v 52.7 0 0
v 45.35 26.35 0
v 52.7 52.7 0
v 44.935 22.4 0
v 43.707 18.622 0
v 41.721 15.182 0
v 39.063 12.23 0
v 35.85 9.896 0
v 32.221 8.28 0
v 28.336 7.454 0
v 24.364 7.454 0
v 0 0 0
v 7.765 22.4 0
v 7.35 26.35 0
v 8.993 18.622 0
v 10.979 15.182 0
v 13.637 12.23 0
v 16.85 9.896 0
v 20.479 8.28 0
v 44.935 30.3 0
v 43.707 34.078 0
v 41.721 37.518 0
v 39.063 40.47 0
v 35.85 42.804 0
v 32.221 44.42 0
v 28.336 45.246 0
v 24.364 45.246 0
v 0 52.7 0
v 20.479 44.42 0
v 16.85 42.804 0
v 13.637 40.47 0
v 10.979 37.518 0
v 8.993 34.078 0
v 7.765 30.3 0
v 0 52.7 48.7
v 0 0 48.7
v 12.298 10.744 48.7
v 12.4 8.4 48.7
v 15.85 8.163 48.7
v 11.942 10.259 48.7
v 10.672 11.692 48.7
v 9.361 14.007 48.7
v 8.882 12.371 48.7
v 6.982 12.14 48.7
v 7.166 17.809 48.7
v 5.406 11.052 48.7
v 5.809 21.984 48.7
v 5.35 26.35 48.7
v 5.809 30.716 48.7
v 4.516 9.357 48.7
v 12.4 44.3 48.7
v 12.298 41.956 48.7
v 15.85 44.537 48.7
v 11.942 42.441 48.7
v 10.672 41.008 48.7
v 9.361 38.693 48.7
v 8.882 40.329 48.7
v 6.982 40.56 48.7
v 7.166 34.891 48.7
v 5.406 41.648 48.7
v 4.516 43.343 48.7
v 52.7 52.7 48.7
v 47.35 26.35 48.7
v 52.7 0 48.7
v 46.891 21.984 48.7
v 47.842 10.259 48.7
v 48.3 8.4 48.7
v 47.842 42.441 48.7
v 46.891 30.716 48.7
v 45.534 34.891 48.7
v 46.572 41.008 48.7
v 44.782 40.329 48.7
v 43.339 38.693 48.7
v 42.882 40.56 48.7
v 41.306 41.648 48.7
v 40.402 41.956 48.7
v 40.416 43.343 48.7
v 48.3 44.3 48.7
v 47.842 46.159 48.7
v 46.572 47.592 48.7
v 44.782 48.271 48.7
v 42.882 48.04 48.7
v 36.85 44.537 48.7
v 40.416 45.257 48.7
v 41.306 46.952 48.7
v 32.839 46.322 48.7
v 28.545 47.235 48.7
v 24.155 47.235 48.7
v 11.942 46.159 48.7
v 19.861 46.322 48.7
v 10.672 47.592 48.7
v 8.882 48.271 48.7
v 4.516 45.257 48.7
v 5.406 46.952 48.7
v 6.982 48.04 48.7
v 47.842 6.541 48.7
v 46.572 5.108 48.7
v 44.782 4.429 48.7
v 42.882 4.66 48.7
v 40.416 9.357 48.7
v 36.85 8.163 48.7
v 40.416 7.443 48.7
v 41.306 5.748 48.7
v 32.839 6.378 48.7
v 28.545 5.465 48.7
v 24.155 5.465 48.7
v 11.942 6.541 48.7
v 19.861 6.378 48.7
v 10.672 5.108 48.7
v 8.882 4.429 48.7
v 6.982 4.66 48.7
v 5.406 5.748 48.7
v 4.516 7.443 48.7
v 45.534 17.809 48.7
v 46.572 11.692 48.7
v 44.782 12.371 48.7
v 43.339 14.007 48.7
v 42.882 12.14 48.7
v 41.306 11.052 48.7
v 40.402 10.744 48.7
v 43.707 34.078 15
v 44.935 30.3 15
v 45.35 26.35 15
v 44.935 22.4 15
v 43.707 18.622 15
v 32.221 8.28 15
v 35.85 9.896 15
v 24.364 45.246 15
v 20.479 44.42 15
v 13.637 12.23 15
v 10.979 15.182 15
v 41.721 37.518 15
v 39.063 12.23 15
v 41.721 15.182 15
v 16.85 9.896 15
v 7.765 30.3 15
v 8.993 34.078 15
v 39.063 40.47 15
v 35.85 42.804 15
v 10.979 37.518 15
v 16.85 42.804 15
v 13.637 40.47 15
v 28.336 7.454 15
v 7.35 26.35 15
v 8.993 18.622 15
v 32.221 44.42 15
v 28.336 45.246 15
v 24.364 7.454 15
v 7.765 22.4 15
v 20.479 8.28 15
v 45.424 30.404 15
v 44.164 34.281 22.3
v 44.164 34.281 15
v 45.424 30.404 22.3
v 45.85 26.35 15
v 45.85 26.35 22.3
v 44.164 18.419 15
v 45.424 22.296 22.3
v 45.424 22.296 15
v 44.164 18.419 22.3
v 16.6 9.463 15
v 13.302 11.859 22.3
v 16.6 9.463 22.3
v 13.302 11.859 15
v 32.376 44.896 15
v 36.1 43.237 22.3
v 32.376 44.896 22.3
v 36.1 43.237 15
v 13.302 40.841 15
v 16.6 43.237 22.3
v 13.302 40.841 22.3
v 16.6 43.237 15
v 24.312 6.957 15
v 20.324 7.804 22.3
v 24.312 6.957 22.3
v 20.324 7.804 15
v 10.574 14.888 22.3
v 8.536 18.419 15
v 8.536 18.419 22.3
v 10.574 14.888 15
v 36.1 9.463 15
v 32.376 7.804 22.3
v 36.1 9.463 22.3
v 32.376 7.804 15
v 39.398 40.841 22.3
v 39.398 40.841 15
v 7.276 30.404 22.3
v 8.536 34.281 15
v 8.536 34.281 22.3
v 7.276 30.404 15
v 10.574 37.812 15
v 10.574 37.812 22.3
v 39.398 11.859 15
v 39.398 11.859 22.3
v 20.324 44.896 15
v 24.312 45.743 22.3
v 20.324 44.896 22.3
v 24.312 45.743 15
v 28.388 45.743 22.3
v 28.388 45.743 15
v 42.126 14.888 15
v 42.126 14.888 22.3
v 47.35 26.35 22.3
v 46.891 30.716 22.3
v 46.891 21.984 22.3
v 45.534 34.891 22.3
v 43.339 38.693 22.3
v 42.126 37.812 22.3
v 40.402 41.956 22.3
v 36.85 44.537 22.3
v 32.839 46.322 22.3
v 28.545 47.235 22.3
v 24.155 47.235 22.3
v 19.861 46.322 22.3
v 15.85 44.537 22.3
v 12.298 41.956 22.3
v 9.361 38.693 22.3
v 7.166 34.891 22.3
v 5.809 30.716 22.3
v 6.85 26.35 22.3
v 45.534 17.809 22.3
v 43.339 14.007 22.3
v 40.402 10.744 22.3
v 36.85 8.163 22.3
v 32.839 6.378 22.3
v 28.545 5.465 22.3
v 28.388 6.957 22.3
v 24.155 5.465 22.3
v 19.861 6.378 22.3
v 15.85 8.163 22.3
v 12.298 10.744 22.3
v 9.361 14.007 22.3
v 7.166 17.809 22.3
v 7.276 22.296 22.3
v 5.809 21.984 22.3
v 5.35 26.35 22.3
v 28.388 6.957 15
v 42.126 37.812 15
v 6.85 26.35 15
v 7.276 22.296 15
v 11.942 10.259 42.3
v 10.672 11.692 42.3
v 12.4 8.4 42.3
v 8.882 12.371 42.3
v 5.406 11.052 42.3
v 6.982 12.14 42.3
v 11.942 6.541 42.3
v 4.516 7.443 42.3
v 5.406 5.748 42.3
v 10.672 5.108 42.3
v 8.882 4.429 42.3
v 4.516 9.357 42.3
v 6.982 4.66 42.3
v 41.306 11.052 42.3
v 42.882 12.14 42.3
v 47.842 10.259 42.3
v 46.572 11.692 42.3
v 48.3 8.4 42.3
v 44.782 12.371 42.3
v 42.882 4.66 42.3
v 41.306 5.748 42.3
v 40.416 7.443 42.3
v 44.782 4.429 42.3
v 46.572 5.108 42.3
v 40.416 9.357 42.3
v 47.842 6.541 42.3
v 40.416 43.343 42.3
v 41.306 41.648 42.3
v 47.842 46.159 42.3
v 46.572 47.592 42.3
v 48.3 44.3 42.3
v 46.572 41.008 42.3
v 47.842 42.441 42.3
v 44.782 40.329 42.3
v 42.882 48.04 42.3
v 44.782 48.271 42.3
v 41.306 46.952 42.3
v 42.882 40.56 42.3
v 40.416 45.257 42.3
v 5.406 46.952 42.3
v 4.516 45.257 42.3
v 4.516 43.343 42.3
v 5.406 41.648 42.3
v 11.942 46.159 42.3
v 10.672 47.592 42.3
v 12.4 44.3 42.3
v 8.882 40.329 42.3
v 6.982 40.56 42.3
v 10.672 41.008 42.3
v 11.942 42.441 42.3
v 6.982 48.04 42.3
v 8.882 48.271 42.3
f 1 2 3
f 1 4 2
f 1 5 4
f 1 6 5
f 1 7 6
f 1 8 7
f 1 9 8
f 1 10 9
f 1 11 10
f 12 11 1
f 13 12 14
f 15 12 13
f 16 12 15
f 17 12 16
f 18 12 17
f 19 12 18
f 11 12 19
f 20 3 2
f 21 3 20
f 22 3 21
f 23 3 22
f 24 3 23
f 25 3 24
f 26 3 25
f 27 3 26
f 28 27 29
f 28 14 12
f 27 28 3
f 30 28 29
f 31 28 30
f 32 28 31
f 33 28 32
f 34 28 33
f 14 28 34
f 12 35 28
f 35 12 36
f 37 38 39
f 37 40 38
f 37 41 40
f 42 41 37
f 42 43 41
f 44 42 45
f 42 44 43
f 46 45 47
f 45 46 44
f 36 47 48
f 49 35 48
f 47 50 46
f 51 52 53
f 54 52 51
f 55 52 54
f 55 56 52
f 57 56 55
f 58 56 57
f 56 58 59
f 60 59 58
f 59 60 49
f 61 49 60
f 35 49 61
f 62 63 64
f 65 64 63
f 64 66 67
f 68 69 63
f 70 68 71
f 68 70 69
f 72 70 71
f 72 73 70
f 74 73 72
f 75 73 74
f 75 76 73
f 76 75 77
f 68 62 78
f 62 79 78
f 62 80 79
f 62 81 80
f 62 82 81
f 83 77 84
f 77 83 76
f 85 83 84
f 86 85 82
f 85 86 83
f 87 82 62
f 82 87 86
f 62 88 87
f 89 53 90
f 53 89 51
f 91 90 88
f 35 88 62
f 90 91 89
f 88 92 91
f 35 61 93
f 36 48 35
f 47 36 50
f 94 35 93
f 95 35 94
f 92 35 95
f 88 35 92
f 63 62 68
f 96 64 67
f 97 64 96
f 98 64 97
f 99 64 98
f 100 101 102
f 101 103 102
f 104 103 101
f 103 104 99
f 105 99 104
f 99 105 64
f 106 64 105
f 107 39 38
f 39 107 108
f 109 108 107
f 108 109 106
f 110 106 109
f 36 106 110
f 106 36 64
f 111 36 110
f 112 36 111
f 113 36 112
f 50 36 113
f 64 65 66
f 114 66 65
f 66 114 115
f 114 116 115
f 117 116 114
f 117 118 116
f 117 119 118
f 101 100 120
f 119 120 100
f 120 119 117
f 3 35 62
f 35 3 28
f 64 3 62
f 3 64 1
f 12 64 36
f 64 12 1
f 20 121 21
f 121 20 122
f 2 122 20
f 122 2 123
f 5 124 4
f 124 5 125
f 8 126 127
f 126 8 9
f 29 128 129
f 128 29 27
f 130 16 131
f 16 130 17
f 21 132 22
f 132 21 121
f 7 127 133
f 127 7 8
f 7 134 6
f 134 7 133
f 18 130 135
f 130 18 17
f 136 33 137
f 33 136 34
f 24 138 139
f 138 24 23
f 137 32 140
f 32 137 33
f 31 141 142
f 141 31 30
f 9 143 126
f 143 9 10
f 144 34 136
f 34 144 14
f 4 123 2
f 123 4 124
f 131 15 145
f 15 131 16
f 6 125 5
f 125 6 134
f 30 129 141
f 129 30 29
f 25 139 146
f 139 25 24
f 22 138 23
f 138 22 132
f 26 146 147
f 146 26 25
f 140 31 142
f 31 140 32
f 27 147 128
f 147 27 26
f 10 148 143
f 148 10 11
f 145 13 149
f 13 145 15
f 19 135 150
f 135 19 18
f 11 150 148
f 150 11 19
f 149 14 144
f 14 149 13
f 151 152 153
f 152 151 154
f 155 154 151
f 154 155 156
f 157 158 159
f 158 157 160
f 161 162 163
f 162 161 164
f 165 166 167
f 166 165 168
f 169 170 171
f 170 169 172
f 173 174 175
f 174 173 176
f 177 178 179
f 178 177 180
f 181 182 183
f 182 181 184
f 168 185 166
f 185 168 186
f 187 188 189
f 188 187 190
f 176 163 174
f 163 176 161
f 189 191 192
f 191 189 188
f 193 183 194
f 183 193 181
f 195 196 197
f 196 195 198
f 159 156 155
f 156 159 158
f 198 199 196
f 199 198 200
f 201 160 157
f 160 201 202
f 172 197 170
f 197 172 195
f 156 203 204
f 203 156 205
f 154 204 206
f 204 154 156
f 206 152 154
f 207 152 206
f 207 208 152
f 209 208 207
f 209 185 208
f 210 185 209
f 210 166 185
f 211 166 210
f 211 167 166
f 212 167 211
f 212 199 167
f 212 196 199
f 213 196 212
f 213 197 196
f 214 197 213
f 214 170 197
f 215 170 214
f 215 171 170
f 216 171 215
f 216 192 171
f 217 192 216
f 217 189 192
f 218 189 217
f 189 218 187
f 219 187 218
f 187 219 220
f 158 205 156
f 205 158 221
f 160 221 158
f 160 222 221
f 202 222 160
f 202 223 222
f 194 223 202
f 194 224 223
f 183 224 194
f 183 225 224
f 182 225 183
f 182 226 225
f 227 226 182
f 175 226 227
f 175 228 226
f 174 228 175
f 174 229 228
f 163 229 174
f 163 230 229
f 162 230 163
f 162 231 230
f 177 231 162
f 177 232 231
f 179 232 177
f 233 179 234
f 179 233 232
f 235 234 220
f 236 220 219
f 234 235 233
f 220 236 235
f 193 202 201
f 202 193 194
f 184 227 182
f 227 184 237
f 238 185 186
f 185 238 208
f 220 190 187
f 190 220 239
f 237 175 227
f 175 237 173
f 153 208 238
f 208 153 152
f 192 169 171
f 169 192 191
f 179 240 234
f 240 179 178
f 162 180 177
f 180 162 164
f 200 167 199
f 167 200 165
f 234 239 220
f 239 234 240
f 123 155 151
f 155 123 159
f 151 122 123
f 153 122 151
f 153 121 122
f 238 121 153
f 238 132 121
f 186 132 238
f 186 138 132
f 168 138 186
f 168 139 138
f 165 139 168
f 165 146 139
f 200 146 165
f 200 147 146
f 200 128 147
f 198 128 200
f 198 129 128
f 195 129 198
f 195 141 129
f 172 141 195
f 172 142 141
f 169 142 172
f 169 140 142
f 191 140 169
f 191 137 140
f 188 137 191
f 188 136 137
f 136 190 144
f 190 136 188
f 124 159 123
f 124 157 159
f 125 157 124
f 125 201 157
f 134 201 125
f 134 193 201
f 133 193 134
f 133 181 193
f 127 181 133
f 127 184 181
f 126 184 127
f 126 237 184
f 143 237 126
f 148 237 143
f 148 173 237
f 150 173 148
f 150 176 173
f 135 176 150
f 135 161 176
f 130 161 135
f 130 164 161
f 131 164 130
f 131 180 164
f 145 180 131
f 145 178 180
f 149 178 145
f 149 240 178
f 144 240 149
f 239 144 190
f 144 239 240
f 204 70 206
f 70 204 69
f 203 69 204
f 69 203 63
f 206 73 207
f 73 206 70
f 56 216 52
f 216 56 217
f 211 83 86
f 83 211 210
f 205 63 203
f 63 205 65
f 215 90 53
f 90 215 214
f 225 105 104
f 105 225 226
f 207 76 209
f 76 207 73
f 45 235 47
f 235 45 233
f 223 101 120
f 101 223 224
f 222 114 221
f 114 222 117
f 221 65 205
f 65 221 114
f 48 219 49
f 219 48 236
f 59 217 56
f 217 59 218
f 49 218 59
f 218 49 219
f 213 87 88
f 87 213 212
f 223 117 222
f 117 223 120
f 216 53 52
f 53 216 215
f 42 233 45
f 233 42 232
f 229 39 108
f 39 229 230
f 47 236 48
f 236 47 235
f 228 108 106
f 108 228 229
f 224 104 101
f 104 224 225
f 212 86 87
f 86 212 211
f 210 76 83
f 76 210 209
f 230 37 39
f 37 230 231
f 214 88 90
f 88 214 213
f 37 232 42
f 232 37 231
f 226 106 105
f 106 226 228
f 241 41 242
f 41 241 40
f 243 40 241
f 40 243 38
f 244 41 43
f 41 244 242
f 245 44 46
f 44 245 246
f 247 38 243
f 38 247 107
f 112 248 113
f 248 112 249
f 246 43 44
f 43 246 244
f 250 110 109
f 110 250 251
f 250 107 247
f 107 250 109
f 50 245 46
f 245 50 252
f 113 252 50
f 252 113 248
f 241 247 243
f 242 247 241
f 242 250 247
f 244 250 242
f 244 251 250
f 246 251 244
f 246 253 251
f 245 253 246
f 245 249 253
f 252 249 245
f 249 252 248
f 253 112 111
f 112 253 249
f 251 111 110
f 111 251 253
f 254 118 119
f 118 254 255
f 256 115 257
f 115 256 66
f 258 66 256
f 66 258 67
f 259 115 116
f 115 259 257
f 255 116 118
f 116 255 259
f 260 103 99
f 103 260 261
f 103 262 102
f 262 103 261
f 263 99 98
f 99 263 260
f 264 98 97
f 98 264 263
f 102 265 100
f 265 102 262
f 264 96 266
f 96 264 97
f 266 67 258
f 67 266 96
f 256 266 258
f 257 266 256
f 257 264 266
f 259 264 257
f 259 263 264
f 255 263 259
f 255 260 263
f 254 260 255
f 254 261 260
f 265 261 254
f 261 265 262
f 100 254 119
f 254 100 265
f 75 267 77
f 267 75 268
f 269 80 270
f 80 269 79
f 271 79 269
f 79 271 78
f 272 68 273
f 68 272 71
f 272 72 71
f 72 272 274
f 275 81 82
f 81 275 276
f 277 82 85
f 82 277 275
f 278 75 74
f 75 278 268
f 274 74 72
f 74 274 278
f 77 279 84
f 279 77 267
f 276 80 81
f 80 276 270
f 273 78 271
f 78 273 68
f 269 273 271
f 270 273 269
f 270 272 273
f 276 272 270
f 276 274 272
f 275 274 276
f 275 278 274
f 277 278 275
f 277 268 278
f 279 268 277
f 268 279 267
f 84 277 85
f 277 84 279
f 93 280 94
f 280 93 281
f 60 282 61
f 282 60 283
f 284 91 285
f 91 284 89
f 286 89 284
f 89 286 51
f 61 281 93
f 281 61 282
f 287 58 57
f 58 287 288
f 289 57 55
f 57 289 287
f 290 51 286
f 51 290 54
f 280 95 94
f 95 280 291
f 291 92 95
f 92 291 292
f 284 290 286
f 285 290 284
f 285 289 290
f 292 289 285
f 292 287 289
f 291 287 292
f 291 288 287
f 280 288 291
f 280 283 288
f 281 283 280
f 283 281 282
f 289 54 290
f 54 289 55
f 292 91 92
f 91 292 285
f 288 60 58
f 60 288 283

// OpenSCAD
  difference(){
  difference(){
  difference(){
  difference(){
  difference(){
  difference(){
  difference(){ 
   linear_extrude(height = 48.7)
            square([52.7, 52.7]);
   
   translate([26.35,026.35,0])
      cylinder(r=19, h=48.7);
  }
            
   translate([26.35,026.35,15])
      cylinder(r=19.5, h=7.3);
  }
  
  translate([26.35,026.35,22.3])
      cylinder(r=21, h=26.4);
  }
  translate([8.4,8.4,42.3])
      cylinder(r=4, h=6.4);
  }
  translate([44.3,8.4,42.3])
      cylinder(r=4, h=6.4);
  }
  translate([44.3,44.3,42.3])
      cylinder(r=4, h=6.4);
  }
  translate([8.4,44.3,42.3])
      cylinder(r=4, h=6.4);
  }
  
      
